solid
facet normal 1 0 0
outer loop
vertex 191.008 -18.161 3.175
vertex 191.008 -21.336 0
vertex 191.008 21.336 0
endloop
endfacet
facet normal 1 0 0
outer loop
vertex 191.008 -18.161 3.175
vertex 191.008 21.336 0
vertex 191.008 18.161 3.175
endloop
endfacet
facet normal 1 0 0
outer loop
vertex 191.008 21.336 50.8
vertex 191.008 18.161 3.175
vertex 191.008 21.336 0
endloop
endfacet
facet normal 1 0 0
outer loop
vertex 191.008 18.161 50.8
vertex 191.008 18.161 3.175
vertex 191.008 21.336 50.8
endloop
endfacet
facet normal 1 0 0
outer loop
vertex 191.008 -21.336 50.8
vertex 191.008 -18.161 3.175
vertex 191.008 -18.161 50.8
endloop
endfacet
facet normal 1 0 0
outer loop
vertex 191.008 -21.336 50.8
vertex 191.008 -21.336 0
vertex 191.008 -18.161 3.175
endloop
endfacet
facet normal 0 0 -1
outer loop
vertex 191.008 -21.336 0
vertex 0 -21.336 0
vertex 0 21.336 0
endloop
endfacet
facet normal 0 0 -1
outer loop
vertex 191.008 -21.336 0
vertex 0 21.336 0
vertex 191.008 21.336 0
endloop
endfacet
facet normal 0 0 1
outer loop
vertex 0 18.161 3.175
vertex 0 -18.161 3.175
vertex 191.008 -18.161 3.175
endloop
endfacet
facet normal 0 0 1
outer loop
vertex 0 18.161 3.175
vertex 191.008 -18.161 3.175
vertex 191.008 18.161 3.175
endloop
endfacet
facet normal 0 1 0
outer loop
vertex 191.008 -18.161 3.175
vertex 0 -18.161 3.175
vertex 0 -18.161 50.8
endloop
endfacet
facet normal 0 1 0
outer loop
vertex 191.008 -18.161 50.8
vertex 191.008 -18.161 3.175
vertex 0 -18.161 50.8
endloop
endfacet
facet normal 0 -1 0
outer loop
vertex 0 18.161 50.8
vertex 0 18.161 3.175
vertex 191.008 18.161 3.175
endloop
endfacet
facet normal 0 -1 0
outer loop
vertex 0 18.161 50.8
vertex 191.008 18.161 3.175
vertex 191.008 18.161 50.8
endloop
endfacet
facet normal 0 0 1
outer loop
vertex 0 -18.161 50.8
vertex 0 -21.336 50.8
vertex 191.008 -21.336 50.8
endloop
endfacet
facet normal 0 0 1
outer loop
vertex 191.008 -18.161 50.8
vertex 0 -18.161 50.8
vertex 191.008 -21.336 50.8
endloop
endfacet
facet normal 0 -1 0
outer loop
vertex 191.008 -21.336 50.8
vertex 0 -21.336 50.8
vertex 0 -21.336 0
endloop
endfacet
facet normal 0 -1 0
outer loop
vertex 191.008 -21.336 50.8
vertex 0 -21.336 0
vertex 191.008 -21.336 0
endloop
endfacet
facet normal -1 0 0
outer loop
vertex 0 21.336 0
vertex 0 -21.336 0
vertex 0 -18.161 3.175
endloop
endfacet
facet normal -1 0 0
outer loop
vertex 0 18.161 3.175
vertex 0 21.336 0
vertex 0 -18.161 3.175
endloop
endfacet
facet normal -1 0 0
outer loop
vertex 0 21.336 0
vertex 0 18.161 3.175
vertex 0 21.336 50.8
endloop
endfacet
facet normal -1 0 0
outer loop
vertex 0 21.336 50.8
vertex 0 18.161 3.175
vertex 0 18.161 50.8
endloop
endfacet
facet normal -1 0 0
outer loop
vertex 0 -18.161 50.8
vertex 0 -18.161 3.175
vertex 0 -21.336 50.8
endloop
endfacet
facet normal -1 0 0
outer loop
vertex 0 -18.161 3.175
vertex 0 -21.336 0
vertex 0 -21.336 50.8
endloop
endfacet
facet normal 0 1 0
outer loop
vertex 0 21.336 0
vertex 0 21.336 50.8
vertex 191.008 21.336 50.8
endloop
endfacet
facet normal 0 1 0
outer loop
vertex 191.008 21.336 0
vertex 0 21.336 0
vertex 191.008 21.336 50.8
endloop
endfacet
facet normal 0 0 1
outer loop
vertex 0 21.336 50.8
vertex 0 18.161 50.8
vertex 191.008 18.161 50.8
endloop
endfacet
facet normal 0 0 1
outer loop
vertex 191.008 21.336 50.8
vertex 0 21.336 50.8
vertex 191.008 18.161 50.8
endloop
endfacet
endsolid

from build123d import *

# Parameters (mm, degrees)
F0_W     = 191.008
F0_H     = 50.8
F1_DEPTH = 21.336
F2_W     = 36.322
F2_H     = 47.625
F3_DEPTH = 191.009


with BuildPart() as f1:
    # F0 (on Front) → F1 (new body, symmetric)
    with BuildSketch(Plane.XZ):
        with Locations((95.504, 25.4)):
            Rectangle(F0_W, F0_H)
    extrude(amount=F1_DEPTH, both=True)

    # F2 (on Right) → F3 (cut, through all)
    with BuildSketch(Plane.YZ):
        with Locations((0, 26.9875)):
            Rectangle(F2_W, F2_H)
    extrude(amount=F3_DEPTH, mode=Mode.SUBTRACT)


solid = f1.part
